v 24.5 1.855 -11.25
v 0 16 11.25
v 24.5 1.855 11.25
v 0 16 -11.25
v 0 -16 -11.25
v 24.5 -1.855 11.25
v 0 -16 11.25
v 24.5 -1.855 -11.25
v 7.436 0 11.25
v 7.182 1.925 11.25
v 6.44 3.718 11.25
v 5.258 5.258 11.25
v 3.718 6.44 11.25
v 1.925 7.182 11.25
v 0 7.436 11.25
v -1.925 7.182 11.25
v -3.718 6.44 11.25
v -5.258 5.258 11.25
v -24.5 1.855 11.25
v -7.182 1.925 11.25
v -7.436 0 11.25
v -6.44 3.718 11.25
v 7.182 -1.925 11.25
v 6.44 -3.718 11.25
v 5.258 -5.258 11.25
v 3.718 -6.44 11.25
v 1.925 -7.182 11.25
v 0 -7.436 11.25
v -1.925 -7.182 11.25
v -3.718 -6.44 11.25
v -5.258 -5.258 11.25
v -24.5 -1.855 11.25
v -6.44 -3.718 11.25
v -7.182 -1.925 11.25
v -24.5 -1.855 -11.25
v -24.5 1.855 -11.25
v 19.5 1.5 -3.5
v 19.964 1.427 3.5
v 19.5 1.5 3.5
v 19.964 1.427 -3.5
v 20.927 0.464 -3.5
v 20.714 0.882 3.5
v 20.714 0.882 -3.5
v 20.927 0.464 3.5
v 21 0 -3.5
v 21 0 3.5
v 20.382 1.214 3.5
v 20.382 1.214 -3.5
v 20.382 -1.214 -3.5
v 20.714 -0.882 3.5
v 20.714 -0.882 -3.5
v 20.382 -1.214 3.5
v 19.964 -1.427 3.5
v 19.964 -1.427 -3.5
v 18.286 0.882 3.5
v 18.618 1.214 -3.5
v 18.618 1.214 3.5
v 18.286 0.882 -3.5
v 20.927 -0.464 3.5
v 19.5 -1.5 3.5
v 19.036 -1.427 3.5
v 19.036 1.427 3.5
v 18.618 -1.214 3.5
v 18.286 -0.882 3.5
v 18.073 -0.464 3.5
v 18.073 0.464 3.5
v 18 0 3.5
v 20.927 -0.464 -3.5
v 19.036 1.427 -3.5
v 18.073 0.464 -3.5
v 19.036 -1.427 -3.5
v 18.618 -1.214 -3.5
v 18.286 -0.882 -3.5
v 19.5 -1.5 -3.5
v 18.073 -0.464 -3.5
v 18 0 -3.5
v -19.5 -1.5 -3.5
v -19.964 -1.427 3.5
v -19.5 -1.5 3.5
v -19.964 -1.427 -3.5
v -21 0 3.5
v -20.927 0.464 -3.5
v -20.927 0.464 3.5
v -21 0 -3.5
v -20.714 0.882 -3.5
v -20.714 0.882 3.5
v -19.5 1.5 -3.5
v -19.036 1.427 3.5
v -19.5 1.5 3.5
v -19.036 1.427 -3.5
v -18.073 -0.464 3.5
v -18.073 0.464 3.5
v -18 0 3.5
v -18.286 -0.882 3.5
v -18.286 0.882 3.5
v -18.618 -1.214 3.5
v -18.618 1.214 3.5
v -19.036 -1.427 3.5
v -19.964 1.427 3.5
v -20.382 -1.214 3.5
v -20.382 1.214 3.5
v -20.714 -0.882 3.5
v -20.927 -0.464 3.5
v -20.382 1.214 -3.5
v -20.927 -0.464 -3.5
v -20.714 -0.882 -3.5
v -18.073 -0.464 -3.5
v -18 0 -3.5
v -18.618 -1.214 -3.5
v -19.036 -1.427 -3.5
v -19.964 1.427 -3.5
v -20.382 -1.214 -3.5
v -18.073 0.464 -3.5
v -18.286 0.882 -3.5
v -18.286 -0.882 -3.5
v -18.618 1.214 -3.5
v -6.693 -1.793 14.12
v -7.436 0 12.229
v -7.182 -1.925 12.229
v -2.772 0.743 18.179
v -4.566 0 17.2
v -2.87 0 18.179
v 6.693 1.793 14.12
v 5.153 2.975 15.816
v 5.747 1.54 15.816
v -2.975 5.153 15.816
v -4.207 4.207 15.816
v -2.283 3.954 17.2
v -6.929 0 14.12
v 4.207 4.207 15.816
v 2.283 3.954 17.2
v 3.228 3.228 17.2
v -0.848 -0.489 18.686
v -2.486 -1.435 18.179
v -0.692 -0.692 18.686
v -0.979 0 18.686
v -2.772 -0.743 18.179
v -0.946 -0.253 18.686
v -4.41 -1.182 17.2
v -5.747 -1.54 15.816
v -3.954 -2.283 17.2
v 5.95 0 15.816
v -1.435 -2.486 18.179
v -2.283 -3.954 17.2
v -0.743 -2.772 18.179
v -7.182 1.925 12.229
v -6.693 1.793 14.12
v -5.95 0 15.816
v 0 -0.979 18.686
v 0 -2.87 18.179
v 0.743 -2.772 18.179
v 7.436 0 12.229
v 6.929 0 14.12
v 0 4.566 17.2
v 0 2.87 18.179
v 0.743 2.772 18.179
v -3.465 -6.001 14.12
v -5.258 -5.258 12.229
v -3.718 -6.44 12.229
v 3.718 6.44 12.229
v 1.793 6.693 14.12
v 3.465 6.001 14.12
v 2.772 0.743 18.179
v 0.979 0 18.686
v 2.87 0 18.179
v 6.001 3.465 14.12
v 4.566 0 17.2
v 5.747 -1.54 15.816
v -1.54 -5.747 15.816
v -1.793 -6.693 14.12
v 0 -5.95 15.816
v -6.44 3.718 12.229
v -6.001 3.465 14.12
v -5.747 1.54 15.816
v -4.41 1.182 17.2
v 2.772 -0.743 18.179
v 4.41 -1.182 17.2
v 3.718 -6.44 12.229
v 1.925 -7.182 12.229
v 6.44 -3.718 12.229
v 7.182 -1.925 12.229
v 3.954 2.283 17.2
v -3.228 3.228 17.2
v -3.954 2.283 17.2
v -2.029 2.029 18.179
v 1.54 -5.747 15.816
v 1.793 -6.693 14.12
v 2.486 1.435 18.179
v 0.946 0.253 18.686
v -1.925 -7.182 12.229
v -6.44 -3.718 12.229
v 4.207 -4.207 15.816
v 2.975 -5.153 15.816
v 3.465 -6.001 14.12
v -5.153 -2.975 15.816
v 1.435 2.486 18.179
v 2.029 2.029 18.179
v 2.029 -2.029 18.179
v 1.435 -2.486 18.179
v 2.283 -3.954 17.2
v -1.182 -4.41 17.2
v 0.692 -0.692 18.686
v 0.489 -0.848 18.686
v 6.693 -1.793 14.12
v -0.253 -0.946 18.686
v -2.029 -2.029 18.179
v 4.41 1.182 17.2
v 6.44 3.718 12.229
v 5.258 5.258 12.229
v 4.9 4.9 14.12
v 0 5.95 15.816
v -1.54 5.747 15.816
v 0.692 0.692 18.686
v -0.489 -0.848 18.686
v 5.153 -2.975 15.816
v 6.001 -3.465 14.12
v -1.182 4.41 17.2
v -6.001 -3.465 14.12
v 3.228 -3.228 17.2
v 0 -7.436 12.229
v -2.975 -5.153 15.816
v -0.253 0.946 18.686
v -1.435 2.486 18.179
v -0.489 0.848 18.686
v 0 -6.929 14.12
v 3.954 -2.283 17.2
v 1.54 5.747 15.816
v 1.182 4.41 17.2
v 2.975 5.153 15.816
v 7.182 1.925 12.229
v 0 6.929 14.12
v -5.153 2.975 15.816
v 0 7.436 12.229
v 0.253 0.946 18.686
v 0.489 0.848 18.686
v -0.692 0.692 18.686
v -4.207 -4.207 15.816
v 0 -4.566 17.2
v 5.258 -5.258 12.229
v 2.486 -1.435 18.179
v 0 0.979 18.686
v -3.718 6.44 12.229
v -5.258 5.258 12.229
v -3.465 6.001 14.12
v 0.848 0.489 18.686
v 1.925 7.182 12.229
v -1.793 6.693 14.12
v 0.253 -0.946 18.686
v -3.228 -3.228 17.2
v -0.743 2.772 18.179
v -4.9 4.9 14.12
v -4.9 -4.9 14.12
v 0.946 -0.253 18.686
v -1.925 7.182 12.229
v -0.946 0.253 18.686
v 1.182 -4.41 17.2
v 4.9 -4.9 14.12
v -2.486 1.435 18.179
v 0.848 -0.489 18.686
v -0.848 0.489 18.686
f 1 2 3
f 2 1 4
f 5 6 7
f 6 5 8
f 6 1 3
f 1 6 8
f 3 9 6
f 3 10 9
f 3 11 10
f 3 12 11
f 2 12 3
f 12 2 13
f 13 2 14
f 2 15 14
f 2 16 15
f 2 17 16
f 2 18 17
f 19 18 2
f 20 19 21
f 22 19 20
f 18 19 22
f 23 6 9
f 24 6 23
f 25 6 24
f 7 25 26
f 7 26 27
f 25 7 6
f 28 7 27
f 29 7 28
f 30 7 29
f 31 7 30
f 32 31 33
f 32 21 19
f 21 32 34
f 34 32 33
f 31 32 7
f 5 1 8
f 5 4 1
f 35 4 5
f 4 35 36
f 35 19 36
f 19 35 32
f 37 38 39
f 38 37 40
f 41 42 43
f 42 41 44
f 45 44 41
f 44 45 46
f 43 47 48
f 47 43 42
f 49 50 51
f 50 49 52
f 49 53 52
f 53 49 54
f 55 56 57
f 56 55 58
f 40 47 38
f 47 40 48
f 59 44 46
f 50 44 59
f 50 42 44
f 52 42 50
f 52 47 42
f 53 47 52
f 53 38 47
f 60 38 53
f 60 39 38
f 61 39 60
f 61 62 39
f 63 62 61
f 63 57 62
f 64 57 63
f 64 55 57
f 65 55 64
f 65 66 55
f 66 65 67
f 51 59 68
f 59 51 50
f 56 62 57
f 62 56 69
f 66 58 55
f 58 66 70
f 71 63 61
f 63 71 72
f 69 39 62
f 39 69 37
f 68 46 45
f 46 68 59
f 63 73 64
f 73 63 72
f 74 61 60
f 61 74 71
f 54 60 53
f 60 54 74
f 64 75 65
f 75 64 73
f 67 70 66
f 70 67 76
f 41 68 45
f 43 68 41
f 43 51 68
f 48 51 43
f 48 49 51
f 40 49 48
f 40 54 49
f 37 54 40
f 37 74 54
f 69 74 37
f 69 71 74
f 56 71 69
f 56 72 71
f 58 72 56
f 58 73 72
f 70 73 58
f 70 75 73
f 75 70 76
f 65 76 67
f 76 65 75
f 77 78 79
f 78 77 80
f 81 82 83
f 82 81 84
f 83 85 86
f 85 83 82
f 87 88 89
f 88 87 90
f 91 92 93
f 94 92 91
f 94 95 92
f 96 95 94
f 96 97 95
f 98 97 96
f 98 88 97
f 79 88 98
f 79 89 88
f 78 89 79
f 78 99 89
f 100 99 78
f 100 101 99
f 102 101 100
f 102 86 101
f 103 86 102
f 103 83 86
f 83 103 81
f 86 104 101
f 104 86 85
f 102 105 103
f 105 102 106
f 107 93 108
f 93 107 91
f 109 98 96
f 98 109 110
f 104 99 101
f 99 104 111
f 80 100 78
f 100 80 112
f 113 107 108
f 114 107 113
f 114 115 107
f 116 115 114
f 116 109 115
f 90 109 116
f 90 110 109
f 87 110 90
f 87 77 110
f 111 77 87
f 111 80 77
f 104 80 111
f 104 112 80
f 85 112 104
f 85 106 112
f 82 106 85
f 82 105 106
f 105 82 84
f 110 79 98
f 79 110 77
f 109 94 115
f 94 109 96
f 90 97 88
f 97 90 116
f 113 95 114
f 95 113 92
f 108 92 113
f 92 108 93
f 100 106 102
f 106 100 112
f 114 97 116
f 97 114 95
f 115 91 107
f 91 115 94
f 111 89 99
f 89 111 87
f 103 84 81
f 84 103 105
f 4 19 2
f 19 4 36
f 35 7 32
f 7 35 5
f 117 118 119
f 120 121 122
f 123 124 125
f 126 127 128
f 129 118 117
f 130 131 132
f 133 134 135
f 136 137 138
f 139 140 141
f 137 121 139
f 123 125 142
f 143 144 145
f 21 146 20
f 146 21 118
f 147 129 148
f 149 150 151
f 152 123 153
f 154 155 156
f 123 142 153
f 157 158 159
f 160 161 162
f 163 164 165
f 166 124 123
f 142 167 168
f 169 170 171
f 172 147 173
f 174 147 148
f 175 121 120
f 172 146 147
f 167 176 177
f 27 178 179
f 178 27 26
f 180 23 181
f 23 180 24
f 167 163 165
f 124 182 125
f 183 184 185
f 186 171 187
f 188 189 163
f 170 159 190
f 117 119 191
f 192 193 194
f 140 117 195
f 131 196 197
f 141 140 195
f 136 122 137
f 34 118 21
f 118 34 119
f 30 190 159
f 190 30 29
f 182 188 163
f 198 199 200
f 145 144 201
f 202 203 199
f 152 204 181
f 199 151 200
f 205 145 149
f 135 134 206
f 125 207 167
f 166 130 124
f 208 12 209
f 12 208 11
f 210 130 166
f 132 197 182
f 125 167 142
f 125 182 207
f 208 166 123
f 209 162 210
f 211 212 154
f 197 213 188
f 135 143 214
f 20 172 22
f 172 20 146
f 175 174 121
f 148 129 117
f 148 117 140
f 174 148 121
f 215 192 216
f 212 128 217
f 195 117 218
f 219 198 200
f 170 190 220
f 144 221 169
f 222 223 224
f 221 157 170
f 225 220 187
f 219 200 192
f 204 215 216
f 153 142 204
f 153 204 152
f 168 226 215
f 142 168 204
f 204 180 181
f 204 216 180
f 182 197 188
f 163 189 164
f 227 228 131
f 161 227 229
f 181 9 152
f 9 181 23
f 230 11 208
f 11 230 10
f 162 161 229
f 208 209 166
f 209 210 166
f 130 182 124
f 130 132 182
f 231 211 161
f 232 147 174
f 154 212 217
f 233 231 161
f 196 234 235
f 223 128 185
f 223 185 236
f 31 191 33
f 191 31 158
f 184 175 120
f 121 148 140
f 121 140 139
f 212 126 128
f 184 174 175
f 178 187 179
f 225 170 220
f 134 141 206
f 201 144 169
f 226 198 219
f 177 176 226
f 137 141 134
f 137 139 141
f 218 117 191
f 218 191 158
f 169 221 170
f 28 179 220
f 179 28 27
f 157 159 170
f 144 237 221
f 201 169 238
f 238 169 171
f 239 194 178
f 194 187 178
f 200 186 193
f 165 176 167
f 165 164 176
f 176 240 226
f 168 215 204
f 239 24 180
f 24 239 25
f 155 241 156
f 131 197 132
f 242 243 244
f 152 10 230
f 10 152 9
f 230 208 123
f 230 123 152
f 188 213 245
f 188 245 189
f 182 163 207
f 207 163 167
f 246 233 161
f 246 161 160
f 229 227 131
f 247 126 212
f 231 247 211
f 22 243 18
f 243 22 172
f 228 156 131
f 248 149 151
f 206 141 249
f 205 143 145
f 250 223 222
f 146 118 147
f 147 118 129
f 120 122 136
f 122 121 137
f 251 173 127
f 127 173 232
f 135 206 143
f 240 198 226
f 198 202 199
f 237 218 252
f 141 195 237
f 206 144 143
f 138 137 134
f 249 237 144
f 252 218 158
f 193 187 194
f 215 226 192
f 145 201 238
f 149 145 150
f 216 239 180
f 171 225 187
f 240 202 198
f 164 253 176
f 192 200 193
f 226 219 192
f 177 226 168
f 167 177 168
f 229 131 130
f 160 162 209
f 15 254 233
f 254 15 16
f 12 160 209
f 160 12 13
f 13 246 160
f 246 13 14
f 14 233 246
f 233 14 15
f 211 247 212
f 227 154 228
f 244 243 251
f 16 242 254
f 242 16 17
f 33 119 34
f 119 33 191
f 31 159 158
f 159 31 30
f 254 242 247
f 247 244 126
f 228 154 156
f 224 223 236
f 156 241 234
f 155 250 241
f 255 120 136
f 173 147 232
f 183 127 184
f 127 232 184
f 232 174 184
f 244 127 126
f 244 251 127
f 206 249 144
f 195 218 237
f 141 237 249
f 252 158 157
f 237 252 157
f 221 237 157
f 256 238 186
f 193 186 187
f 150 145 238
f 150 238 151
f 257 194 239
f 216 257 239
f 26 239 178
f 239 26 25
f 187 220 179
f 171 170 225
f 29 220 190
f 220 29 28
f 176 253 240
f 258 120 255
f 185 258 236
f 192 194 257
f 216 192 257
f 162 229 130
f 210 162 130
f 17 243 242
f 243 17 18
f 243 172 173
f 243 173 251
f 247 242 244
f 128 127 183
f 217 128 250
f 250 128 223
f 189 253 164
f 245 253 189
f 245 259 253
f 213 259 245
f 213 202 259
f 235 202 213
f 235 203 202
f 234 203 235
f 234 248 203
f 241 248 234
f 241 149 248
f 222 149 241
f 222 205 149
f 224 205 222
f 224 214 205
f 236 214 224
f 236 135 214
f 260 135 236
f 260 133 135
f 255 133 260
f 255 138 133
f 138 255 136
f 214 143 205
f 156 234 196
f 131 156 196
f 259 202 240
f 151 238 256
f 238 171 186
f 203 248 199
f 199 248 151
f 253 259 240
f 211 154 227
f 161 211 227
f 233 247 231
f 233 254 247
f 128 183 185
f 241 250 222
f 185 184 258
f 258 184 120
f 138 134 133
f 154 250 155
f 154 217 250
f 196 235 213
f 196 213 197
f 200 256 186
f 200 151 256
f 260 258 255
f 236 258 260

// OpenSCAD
module base_ball_caster(){
	difference(){
		cube([49,32,22.5], center=true);
		screw_hole();
		mirror( [1, 0, 0] ){
			screw_hole();
		}
		linear_extrude(height = 30, center = true, convexity = 10, twist = 0)
			translate([-20,  16]){circle(20,$fn=3);}
		linear_extrude(height = 30, center = true, convexity = 10, twist = 0)
			translate([-20,  -16]){circle(20,$fn=3);}
		mirror([1,0,0]){
			linear_extrude(height = 30, center = true, convexity = 10, twist = 0)
				translate([-20,  16]){circle(20,$fn=3);}
			linear_extrude(height = 30, center = true, convexity = 10, twist = 0)
				translate([-20,  -16]){circle(20,$fn=3);}
		}
	}
	translate([0,0,11.25]){
		sphere(r = 7.5, center=true);
	}
}

module screw_hole(){
	translate([19.5,0,0]) 
		cylinder(r1=1.5, r2=1.5, h=7, center=true, $fn=20);
}


base_ball_caster();
